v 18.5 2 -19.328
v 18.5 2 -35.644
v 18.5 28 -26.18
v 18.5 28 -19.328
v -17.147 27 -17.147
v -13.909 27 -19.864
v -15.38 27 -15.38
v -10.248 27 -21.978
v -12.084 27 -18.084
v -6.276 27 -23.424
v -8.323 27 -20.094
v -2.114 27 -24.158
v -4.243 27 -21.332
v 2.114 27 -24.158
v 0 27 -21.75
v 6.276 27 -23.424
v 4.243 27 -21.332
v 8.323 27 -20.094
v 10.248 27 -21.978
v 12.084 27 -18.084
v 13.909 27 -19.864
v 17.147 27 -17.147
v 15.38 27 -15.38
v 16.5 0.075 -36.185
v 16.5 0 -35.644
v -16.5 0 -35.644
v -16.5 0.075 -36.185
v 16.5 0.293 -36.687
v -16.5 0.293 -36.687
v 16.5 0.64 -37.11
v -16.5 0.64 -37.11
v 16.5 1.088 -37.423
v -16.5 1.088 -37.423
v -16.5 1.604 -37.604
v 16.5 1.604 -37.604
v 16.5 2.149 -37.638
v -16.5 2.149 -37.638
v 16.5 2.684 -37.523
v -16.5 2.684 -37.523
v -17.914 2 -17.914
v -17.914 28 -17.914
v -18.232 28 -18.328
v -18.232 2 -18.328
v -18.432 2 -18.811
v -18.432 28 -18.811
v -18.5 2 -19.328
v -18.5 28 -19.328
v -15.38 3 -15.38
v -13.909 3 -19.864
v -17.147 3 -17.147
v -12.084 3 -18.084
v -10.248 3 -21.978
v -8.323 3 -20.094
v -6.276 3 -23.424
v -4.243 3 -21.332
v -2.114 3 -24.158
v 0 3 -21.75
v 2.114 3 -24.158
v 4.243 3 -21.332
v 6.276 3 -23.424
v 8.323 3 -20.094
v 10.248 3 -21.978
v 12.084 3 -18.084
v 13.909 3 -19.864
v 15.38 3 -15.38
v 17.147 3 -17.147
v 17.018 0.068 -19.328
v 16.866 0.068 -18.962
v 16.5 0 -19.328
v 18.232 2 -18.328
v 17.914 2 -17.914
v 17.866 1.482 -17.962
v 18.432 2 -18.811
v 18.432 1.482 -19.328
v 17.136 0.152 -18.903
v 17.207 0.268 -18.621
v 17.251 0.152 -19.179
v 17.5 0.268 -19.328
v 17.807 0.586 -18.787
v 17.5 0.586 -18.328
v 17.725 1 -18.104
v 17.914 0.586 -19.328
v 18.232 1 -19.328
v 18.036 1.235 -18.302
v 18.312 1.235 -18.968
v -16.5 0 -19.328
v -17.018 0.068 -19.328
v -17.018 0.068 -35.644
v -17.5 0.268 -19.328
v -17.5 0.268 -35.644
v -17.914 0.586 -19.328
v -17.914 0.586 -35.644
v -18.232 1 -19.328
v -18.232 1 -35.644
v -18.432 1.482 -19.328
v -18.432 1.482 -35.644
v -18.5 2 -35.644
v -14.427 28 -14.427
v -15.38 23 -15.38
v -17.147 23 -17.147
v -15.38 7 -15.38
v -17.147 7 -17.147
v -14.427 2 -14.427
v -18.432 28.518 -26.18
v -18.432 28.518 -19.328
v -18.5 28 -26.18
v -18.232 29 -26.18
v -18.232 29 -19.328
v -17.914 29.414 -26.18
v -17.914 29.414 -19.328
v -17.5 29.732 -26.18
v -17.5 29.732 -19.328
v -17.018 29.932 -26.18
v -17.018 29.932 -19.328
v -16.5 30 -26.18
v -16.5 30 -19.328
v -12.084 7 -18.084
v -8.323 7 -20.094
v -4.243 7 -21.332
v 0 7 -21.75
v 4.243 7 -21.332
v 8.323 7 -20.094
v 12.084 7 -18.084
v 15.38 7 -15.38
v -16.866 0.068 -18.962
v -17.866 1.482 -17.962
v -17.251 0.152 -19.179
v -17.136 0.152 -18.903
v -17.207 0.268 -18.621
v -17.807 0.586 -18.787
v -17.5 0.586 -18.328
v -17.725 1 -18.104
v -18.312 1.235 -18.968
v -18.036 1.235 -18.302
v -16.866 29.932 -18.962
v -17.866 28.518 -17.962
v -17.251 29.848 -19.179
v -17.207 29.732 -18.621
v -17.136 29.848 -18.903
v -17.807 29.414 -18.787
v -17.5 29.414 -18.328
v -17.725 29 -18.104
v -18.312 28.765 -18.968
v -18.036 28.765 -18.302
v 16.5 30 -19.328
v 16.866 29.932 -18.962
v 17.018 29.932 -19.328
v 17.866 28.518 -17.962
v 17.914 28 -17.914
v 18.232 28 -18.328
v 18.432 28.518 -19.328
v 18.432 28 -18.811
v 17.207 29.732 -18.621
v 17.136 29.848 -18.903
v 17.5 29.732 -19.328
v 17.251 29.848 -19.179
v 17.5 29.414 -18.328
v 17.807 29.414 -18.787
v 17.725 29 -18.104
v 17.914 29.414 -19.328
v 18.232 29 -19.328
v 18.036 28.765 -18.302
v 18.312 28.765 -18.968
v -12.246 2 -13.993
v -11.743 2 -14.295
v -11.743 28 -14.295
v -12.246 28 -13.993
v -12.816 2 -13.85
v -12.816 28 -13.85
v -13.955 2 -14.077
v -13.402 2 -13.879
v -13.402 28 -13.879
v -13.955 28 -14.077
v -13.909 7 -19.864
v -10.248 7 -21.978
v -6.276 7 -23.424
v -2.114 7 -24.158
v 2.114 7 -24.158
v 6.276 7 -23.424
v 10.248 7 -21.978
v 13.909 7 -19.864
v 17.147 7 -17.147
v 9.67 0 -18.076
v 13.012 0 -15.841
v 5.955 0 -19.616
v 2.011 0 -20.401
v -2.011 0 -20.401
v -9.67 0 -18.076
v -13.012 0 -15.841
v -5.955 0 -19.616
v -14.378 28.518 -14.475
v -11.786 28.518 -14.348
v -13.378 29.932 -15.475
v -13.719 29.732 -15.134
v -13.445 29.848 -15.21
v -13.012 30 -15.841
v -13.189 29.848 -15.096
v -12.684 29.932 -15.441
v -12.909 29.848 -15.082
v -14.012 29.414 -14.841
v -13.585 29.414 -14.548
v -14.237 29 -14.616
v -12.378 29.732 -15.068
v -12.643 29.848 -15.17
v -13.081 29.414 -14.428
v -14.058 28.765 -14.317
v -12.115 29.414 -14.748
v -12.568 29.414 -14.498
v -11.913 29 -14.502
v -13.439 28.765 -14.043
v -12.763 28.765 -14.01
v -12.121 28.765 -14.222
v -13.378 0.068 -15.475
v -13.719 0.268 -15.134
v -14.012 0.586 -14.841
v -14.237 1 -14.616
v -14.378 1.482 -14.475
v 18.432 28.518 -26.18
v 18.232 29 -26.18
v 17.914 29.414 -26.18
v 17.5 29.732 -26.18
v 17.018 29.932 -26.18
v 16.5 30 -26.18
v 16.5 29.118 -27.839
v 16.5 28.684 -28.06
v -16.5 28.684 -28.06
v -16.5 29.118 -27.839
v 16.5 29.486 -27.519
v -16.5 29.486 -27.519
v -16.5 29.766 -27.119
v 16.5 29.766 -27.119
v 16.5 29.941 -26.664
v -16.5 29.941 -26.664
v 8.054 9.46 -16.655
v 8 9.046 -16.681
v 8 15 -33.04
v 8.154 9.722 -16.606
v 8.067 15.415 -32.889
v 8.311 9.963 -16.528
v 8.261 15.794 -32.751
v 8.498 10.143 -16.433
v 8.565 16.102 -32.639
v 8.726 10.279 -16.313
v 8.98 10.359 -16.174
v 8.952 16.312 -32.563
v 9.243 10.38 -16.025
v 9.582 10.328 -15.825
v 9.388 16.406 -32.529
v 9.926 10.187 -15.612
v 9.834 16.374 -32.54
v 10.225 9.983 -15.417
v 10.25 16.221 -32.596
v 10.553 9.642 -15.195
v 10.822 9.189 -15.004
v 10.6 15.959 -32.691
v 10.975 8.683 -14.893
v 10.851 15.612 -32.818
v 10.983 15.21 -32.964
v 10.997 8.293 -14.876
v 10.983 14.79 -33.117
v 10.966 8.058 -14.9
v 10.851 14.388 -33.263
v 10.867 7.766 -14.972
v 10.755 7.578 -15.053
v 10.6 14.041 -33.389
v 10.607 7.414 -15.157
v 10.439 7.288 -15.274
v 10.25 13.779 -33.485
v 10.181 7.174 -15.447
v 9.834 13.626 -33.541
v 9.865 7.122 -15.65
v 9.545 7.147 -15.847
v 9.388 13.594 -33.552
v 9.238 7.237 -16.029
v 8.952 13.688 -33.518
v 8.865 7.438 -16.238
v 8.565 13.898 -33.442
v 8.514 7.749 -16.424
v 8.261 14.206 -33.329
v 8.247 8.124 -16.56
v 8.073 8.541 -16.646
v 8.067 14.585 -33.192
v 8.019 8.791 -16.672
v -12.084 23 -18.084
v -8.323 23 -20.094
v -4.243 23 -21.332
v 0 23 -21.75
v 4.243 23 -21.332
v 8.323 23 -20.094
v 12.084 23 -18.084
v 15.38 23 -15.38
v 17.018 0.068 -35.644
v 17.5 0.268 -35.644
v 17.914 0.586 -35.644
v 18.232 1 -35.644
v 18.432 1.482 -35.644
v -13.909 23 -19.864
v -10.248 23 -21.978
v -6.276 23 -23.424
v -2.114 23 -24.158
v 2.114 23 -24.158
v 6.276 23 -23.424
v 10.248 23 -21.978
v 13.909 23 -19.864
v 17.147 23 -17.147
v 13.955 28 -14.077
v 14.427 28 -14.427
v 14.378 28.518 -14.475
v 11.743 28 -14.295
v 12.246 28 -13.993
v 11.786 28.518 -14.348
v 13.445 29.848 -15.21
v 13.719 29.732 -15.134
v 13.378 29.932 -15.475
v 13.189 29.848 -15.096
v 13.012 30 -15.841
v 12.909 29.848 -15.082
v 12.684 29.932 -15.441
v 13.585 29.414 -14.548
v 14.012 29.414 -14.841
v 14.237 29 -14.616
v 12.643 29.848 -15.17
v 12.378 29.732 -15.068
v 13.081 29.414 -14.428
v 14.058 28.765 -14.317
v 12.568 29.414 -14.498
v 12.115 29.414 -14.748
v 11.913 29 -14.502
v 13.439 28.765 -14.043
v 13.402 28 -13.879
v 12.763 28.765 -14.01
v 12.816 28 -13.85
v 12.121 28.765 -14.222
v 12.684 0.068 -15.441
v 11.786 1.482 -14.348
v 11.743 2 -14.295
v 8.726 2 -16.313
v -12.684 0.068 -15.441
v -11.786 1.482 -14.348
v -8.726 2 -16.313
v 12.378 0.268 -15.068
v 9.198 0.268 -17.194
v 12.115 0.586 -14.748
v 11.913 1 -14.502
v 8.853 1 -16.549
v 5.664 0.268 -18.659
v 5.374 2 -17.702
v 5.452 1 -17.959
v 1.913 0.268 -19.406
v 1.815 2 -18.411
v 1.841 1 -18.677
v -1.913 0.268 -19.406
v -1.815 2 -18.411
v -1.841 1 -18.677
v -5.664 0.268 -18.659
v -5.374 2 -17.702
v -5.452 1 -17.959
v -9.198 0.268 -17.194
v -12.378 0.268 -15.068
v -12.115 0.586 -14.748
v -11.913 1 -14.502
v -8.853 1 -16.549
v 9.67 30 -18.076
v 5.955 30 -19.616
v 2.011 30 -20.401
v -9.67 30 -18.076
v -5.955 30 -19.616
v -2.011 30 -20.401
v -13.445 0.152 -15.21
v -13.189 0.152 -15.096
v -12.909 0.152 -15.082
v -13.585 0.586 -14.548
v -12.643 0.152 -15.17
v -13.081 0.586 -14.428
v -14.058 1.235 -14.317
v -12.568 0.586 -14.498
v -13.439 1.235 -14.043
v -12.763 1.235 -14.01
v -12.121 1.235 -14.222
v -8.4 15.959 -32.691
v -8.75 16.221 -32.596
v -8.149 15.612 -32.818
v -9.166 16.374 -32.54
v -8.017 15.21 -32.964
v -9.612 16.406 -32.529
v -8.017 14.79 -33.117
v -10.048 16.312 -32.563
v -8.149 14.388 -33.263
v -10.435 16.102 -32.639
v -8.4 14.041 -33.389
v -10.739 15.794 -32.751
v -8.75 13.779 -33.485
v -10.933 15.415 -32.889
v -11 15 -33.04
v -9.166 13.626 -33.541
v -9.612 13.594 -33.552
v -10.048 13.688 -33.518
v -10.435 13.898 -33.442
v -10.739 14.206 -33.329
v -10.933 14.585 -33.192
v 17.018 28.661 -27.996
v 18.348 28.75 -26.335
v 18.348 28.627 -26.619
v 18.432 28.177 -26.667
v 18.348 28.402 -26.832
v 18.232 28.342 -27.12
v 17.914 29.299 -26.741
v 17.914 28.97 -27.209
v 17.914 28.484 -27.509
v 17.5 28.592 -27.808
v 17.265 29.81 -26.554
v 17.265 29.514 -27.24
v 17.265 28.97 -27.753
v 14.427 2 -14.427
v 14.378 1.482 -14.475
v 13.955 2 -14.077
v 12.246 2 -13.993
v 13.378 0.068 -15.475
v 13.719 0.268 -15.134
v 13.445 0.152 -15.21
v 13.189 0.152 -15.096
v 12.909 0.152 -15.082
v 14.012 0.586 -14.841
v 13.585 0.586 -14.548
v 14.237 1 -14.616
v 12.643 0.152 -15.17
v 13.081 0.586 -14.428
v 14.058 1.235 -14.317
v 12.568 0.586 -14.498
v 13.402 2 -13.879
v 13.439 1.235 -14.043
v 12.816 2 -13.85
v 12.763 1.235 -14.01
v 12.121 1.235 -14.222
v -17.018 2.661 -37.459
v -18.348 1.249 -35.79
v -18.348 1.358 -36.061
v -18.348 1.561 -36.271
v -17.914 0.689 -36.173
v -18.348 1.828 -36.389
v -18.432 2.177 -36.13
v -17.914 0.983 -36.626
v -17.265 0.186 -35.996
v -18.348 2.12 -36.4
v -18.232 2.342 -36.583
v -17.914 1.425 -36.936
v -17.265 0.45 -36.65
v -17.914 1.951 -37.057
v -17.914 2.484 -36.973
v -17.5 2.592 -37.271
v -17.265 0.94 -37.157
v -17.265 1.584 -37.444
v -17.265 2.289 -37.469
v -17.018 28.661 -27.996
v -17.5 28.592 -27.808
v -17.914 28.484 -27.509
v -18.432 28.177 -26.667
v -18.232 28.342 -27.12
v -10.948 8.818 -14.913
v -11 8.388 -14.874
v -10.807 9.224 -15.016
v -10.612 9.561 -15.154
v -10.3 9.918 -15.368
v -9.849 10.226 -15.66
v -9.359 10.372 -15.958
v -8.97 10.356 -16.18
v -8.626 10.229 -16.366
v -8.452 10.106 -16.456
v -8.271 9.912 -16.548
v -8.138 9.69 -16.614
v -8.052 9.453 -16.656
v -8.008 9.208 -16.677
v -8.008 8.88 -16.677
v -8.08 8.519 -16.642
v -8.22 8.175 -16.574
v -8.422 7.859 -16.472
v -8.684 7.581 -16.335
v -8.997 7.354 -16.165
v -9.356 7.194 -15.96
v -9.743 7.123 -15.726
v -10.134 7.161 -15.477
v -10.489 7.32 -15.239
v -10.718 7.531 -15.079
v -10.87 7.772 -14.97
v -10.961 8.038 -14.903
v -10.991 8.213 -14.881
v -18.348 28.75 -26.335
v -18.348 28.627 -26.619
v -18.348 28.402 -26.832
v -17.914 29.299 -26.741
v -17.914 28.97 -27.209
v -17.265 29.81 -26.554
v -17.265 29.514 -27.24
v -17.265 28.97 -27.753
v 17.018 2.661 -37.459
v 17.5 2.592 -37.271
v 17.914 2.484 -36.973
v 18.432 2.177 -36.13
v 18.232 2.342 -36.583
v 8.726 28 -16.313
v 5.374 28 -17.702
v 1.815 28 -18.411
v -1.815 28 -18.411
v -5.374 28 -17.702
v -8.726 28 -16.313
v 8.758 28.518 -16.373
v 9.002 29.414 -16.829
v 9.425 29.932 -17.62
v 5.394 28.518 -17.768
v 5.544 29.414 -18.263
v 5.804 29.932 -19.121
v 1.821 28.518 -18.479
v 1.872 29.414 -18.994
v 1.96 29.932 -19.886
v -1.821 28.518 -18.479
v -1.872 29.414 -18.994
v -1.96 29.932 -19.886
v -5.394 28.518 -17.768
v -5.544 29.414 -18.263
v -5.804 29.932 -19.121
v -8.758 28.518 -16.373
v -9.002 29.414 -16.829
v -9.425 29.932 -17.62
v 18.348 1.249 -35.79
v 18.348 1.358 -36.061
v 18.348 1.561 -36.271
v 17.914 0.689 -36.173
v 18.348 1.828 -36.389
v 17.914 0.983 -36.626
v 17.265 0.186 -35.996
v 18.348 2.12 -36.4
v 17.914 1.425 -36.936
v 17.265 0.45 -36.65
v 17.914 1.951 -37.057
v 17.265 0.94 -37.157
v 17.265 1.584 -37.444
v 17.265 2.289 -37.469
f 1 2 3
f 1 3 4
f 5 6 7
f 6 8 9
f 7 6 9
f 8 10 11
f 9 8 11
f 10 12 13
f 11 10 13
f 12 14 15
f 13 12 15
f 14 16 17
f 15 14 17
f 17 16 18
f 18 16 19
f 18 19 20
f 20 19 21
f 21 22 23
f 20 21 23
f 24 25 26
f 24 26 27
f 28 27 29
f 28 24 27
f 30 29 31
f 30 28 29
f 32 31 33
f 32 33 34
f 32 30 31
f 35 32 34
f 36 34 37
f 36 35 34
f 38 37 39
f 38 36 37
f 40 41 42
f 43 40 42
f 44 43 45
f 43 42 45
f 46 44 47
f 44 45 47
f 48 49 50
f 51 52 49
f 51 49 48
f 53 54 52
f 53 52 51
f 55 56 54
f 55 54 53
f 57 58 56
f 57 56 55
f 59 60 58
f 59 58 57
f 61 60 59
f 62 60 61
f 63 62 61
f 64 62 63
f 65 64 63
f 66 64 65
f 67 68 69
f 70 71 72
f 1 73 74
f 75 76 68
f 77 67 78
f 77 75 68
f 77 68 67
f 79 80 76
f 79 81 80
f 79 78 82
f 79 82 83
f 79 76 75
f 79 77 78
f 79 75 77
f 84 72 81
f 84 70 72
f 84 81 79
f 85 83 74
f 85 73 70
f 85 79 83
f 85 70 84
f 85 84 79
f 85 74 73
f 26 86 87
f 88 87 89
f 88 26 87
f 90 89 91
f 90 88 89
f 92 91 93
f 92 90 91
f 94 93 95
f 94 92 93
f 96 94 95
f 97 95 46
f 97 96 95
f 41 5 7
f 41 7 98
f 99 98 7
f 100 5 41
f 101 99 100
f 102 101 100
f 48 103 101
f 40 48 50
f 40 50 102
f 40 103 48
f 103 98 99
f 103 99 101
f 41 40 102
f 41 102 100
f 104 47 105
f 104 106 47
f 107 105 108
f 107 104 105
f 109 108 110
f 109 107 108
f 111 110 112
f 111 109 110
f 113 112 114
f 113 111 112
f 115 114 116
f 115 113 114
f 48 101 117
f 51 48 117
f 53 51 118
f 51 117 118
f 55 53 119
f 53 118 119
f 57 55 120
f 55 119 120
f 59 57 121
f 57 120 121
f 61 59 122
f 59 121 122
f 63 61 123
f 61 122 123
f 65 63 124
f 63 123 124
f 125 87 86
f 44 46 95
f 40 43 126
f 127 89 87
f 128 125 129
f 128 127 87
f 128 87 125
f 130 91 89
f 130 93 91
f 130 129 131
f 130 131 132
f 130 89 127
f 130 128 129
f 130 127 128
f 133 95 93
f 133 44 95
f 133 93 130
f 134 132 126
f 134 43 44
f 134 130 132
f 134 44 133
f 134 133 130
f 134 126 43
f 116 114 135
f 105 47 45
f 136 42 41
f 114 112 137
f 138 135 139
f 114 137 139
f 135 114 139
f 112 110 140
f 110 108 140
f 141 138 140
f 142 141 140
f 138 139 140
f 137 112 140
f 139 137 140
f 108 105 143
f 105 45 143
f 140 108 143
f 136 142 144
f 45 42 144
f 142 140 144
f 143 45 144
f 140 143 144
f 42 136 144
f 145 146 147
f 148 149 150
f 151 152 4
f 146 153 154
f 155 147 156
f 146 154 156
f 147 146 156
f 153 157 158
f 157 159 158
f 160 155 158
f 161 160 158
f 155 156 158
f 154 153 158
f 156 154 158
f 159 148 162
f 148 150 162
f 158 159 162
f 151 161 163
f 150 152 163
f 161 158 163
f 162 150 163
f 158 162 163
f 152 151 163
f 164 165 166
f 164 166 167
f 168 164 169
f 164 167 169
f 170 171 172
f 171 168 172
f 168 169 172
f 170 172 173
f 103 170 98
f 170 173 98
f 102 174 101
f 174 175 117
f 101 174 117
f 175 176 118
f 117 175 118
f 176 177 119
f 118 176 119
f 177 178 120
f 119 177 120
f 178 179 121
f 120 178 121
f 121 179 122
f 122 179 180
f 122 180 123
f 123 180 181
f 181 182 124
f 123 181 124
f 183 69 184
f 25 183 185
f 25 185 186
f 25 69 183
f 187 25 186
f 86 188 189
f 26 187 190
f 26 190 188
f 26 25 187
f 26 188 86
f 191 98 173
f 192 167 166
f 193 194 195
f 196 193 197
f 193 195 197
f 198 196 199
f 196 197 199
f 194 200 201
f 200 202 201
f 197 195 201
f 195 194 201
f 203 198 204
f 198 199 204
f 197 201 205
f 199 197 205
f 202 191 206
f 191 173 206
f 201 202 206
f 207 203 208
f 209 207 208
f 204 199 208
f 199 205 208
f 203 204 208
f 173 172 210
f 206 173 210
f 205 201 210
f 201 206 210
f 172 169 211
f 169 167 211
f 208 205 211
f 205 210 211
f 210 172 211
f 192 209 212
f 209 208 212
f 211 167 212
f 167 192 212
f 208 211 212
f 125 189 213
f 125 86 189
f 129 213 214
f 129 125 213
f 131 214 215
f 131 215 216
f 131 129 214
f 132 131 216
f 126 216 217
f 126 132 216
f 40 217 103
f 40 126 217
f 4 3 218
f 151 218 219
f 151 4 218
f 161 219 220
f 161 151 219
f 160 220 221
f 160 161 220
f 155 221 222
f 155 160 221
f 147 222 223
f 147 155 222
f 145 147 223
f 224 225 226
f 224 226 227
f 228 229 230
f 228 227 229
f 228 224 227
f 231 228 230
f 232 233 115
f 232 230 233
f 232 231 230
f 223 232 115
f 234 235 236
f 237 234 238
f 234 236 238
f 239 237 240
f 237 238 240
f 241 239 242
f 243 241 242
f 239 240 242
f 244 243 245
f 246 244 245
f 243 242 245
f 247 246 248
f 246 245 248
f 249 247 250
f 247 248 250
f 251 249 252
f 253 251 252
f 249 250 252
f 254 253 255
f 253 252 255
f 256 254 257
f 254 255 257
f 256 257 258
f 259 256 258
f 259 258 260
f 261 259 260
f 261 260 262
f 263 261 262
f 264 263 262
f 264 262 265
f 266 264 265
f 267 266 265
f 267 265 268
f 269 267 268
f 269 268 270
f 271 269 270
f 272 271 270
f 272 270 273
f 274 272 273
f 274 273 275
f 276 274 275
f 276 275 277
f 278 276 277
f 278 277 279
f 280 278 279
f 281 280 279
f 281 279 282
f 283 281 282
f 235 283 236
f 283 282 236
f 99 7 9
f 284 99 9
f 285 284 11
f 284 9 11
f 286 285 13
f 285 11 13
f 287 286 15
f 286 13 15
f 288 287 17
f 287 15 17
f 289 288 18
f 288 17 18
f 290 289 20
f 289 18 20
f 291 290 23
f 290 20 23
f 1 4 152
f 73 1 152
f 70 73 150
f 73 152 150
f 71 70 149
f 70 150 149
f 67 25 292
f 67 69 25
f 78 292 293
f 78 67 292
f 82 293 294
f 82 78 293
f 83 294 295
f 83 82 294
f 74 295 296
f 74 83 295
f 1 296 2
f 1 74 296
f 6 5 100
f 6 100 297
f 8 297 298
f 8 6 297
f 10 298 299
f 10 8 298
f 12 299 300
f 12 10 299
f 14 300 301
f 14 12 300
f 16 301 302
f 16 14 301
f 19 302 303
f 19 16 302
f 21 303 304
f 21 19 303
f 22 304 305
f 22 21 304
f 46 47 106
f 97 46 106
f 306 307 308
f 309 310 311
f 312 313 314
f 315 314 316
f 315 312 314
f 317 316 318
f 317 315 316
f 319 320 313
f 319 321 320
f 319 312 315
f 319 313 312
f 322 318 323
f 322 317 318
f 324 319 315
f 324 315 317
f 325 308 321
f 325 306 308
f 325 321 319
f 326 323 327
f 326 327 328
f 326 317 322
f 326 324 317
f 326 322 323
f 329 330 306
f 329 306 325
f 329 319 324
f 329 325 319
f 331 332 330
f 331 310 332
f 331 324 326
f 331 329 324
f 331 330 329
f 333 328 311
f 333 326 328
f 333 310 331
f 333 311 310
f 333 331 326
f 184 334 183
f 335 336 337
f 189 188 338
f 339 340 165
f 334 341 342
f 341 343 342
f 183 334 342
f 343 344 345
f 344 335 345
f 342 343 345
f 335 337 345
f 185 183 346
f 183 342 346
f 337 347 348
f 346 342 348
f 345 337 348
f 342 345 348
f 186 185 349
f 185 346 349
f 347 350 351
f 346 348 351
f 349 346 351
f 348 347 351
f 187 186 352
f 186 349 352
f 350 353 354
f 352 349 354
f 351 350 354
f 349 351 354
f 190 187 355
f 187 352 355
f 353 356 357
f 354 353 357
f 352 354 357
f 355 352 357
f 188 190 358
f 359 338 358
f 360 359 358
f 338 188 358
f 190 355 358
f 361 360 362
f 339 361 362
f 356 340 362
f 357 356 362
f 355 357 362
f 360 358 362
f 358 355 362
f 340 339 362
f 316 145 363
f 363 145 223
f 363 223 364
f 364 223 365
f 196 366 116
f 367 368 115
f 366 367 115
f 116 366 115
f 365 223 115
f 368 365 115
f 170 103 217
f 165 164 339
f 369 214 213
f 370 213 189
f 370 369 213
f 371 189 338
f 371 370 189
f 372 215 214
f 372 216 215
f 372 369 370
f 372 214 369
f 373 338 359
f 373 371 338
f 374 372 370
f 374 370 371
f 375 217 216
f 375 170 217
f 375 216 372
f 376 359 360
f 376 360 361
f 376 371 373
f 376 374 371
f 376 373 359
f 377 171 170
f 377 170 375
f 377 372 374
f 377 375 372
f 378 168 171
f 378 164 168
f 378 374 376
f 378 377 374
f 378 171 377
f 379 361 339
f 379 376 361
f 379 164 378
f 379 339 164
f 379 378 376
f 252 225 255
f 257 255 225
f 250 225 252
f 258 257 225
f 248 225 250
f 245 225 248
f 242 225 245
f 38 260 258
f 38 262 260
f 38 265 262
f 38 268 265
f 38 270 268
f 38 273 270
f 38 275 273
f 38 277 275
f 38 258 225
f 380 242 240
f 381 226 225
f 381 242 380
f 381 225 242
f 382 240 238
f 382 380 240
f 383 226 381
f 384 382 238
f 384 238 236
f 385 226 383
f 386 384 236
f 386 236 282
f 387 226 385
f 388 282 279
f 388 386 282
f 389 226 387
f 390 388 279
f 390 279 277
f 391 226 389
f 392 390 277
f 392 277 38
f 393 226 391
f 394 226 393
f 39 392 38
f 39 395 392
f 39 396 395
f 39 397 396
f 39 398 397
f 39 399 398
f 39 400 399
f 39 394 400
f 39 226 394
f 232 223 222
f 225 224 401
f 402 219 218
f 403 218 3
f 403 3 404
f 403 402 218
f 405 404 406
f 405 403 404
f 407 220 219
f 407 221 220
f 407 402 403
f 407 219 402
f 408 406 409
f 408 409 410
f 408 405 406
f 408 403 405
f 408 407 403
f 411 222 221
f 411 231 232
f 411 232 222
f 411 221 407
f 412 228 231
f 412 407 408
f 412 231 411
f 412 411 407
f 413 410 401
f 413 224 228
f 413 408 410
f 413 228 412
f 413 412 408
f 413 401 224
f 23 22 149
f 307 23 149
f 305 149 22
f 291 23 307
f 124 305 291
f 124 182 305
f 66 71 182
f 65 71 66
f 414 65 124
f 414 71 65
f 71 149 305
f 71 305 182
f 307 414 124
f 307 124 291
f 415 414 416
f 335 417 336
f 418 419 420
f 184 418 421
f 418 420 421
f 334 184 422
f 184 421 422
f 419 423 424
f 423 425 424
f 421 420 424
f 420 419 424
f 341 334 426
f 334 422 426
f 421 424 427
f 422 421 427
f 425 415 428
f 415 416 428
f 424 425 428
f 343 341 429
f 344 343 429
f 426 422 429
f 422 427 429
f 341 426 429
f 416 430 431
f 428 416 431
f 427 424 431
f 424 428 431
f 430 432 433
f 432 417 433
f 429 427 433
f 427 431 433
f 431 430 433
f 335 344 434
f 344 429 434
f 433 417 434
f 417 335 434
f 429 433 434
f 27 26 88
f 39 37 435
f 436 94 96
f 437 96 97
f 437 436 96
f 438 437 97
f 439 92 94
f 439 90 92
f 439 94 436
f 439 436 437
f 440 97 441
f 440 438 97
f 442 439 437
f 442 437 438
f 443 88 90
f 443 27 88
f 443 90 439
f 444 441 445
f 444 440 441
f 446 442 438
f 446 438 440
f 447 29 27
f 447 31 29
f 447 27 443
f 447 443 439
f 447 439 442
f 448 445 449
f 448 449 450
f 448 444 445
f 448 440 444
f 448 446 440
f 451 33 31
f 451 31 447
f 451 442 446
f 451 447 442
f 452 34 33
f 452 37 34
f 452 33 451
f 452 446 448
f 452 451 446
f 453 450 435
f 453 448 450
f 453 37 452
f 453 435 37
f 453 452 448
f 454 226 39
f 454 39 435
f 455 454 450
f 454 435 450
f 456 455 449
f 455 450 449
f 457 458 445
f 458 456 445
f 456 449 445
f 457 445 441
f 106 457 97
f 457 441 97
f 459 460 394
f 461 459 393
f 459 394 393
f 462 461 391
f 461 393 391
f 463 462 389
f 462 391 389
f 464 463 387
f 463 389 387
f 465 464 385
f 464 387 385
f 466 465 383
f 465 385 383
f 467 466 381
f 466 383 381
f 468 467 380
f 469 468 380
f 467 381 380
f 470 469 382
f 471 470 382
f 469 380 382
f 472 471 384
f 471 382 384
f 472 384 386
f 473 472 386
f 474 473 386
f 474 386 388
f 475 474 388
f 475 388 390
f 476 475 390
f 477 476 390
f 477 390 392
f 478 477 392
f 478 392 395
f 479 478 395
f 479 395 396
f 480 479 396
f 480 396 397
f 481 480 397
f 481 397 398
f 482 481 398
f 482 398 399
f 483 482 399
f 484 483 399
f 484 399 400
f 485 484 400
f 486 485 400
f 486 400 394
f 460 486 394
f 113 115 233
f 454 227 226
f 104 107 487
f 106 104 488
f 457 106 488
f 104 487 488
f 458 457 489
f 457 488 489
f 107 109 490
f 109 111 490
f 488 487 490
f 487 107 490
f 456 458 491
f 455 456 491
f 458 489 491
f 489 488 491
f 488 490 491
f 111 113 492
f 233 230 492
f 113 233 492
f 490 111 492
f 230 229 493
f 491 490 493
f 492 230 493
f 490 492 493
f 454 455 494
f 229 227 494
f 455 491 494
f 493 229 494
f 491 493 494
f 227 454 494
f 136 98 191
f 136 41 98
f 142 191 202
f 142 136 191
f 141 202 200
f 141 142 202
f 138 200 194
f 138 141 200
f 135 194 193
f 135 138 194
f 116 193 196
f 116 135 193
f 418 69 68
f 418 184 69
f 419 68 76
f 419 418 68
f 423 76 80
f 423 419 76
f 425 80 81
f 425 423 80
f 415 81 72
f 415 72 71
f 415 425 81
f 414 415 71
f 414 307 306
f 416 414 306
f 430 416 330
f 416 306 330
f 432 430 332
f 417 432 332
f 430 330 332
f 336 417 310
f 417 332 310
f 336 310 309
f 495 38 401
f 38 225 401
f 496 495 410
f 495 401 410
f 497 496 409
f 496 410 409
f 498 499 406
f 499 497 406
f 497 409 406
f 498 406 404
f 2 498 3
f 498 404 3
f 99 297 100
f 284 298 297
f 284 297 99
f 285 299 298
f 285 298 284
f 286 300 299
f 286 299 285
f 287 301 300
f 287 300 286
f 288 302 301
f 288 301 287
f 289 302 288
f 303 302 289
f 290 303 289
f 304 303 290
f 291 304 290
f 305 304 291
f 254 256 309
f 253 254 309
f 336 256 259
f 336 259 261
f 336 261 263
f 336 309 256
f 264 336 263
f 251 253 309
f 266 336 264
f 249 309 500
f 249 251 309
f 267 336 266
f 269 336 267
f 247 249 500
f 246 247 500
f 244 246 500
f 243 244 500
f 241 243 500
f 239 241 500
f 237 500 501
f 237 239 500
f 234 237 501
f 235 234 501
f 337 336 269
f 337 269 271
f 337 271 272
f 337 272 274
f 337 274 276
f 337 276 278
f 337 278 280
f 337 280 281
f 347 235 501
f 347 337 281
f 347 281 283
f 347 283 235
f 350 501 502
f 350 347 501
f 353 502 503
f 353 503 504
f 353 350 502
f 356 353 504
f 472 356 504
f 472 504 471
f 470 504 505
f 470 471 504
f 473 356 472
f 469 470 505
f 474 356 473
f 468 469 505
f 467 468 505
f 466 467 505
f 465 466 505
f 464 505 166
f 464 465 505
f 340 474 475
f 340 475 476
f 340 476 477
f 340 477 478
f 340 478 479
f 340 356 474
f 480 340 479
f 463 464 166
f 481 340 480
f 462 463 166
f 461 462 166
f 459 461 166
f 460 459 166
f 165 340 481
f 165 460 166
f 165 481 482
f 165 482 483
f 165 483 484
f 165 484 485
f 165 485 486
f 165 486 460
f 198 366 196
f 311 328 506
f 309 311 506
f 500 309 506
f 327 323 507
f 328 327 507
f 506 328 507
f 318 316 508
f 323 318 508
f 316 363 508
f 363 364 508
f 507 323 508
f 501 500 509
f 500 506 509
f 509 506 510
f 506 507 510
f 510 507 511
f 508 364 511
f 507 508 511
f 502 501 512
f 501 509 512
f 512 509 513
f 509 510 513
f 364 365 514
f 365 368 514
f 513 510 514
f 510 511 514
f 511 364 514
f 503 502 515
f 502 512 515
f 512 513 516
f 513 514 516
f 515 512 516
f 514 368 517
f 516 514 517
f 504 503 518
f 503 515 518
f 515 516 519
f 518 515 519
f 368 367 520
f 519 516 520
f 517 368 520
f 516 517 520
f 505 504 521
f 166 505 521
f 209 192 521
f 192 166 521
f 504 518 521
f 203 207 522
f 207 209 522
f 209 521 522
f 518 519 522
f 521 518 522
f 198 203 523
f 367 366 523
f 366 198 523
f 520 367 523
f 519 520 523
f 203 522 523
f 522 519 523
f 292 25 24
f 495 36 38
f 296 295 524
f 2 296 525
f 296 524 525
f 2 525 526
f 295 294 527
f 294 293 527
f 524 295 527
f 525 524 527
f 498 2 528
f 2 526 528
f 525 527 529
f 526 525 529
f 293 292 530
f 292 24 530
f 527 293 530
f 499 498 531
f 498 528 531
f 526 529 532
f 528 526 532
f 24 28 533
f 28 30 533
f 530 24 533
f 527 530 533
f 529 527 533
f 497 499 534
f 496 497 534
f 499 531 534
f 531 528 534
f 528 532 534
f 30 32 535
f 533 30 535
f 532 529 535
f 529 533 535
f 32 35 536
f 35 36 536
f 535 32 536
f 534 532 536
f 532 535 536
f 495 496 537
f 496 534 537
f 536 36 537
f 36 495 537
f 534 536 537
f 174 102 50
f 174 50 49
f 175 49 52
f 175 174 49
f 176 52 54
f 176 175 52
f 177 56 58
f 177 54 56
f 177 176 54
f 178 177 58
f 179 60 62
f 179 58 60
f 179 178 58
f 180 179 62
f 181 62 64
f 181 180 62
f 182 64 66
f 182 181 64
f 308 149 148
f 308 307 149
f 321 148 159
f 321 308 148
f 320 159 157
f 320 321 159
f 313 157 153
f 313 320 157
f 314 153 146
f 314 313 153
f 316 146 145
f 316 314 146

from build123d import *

# Parameters (mm, degrees)
BOSS_EXTRUDE1_DEPTH = 30
SKETCH4_R           = 1.5
CUT_EXTRUDE1_DEPTH  = 24.885599949
FILLET1_R           = 2
SKETCH5_W           = 2.5
SKETCH5_H           = 4


with BuildPart() as part:
    # Sketch3 → Boss-Extrude1 (new body)
    with BuildSketch(Plane(origin=(0, 0, 0), x_dir=(1, 0, 0), z_dir=(0, 1, 0))):
        with BuildLine():
            Line((-18.5, 38.5), (18.5, 38.5))
            Line((18.5, 38.5), (18.5, 18.5))
            Line((18.5, 18.5), (13.081475452, 13.081475452))
            ThreePointArc((13.081475452, 13.081475452), (0, 18.5), (-13.081475452, 13.081475452))
            Line((-13.081475452, 13.081475452), (-18.5, 18.5))
            Line((-18.5, 18.5), (-18.5, 38.5))
        make_face()
    extrude(amount=BOSS_EXTRUDE1_DEPTH)

    # Split1
    split(bisect_by=Plane(origin=(0, 12.373661486, -33.99635553), x_dir=(0, -0.939692621, -0.342020143), z_dir=(0, 0.342020143, -0.939692621)), keep=Keep.BOTTOM)

    # Sketch4 → Cut-Extrude1 (cut, through all)
    with BuildSketch(Plane(origin=(0, 12.373661486, -33.99635553), x_dir=(-1, 0, 0), z_dir=(0, 0.342020143, -0.939692621))):
        with Locations((9.5, 2.794891069)):
            Circle(SKETCH4_R)
        with Locations((-9.5, 2.794891069)):
            Circle(SKETCH4_R)
    extrude(amount=-CUT_EXTRUDE1_DEPTH, mode=Mode.SUBTRACT)

    # Fillet1
    fillet1_edges = [part.edges().sort_by_distance(p)[0] for p in [
        (15.790737726, 0, -15.790737726),
        (18.5, 0, -28.5),
        (-18.5, 0, -28.5),
        (-15.790737726, 0, -15.790737726),
        (0, 0, -18.5),
        (15.790737726, 30, -15.790737726),
        (18.5, 30, -23.040446486),
        (-18.5, 30, -23.040446486),
        (-15.790737726, 30, -15.790737726),
        (0, 30, -18.5),
        (13.081475452, 15, -13.081475452),
        (-13.081475452, 15, -13.081475452),
        (-18.5, 15, -18.5),
        (18.5, 15, -18.5),
        (18.5, 15, -33.040446486),
        (-18.5, 15, -33.040446486),
        (0, 30, -27.580892972),
        (0, 0, -38.5),
    ]]
    fillet(fillet1_edges, radius=FILLET1_R)

    # Sketch5 → Cut-Revolve1 (revolve, cut)
    with BuildSketch(Plane(origin=(0, 0, 0), x_dir=(0, 0, -1), z_dir=(1, 0, 0))):
        with Locations((23, 5)):
            Rectangle(SKETCH5_W, SKETCH5_H)
        with Locations((23, 25)):
            Rectangle(SKETCH5_W, SKETCH5_H)
    revolve(axis=Axis((0, 30, 0), (0, -1, 0)), mode=Mode.SUBTRACT)


solid = part.part
